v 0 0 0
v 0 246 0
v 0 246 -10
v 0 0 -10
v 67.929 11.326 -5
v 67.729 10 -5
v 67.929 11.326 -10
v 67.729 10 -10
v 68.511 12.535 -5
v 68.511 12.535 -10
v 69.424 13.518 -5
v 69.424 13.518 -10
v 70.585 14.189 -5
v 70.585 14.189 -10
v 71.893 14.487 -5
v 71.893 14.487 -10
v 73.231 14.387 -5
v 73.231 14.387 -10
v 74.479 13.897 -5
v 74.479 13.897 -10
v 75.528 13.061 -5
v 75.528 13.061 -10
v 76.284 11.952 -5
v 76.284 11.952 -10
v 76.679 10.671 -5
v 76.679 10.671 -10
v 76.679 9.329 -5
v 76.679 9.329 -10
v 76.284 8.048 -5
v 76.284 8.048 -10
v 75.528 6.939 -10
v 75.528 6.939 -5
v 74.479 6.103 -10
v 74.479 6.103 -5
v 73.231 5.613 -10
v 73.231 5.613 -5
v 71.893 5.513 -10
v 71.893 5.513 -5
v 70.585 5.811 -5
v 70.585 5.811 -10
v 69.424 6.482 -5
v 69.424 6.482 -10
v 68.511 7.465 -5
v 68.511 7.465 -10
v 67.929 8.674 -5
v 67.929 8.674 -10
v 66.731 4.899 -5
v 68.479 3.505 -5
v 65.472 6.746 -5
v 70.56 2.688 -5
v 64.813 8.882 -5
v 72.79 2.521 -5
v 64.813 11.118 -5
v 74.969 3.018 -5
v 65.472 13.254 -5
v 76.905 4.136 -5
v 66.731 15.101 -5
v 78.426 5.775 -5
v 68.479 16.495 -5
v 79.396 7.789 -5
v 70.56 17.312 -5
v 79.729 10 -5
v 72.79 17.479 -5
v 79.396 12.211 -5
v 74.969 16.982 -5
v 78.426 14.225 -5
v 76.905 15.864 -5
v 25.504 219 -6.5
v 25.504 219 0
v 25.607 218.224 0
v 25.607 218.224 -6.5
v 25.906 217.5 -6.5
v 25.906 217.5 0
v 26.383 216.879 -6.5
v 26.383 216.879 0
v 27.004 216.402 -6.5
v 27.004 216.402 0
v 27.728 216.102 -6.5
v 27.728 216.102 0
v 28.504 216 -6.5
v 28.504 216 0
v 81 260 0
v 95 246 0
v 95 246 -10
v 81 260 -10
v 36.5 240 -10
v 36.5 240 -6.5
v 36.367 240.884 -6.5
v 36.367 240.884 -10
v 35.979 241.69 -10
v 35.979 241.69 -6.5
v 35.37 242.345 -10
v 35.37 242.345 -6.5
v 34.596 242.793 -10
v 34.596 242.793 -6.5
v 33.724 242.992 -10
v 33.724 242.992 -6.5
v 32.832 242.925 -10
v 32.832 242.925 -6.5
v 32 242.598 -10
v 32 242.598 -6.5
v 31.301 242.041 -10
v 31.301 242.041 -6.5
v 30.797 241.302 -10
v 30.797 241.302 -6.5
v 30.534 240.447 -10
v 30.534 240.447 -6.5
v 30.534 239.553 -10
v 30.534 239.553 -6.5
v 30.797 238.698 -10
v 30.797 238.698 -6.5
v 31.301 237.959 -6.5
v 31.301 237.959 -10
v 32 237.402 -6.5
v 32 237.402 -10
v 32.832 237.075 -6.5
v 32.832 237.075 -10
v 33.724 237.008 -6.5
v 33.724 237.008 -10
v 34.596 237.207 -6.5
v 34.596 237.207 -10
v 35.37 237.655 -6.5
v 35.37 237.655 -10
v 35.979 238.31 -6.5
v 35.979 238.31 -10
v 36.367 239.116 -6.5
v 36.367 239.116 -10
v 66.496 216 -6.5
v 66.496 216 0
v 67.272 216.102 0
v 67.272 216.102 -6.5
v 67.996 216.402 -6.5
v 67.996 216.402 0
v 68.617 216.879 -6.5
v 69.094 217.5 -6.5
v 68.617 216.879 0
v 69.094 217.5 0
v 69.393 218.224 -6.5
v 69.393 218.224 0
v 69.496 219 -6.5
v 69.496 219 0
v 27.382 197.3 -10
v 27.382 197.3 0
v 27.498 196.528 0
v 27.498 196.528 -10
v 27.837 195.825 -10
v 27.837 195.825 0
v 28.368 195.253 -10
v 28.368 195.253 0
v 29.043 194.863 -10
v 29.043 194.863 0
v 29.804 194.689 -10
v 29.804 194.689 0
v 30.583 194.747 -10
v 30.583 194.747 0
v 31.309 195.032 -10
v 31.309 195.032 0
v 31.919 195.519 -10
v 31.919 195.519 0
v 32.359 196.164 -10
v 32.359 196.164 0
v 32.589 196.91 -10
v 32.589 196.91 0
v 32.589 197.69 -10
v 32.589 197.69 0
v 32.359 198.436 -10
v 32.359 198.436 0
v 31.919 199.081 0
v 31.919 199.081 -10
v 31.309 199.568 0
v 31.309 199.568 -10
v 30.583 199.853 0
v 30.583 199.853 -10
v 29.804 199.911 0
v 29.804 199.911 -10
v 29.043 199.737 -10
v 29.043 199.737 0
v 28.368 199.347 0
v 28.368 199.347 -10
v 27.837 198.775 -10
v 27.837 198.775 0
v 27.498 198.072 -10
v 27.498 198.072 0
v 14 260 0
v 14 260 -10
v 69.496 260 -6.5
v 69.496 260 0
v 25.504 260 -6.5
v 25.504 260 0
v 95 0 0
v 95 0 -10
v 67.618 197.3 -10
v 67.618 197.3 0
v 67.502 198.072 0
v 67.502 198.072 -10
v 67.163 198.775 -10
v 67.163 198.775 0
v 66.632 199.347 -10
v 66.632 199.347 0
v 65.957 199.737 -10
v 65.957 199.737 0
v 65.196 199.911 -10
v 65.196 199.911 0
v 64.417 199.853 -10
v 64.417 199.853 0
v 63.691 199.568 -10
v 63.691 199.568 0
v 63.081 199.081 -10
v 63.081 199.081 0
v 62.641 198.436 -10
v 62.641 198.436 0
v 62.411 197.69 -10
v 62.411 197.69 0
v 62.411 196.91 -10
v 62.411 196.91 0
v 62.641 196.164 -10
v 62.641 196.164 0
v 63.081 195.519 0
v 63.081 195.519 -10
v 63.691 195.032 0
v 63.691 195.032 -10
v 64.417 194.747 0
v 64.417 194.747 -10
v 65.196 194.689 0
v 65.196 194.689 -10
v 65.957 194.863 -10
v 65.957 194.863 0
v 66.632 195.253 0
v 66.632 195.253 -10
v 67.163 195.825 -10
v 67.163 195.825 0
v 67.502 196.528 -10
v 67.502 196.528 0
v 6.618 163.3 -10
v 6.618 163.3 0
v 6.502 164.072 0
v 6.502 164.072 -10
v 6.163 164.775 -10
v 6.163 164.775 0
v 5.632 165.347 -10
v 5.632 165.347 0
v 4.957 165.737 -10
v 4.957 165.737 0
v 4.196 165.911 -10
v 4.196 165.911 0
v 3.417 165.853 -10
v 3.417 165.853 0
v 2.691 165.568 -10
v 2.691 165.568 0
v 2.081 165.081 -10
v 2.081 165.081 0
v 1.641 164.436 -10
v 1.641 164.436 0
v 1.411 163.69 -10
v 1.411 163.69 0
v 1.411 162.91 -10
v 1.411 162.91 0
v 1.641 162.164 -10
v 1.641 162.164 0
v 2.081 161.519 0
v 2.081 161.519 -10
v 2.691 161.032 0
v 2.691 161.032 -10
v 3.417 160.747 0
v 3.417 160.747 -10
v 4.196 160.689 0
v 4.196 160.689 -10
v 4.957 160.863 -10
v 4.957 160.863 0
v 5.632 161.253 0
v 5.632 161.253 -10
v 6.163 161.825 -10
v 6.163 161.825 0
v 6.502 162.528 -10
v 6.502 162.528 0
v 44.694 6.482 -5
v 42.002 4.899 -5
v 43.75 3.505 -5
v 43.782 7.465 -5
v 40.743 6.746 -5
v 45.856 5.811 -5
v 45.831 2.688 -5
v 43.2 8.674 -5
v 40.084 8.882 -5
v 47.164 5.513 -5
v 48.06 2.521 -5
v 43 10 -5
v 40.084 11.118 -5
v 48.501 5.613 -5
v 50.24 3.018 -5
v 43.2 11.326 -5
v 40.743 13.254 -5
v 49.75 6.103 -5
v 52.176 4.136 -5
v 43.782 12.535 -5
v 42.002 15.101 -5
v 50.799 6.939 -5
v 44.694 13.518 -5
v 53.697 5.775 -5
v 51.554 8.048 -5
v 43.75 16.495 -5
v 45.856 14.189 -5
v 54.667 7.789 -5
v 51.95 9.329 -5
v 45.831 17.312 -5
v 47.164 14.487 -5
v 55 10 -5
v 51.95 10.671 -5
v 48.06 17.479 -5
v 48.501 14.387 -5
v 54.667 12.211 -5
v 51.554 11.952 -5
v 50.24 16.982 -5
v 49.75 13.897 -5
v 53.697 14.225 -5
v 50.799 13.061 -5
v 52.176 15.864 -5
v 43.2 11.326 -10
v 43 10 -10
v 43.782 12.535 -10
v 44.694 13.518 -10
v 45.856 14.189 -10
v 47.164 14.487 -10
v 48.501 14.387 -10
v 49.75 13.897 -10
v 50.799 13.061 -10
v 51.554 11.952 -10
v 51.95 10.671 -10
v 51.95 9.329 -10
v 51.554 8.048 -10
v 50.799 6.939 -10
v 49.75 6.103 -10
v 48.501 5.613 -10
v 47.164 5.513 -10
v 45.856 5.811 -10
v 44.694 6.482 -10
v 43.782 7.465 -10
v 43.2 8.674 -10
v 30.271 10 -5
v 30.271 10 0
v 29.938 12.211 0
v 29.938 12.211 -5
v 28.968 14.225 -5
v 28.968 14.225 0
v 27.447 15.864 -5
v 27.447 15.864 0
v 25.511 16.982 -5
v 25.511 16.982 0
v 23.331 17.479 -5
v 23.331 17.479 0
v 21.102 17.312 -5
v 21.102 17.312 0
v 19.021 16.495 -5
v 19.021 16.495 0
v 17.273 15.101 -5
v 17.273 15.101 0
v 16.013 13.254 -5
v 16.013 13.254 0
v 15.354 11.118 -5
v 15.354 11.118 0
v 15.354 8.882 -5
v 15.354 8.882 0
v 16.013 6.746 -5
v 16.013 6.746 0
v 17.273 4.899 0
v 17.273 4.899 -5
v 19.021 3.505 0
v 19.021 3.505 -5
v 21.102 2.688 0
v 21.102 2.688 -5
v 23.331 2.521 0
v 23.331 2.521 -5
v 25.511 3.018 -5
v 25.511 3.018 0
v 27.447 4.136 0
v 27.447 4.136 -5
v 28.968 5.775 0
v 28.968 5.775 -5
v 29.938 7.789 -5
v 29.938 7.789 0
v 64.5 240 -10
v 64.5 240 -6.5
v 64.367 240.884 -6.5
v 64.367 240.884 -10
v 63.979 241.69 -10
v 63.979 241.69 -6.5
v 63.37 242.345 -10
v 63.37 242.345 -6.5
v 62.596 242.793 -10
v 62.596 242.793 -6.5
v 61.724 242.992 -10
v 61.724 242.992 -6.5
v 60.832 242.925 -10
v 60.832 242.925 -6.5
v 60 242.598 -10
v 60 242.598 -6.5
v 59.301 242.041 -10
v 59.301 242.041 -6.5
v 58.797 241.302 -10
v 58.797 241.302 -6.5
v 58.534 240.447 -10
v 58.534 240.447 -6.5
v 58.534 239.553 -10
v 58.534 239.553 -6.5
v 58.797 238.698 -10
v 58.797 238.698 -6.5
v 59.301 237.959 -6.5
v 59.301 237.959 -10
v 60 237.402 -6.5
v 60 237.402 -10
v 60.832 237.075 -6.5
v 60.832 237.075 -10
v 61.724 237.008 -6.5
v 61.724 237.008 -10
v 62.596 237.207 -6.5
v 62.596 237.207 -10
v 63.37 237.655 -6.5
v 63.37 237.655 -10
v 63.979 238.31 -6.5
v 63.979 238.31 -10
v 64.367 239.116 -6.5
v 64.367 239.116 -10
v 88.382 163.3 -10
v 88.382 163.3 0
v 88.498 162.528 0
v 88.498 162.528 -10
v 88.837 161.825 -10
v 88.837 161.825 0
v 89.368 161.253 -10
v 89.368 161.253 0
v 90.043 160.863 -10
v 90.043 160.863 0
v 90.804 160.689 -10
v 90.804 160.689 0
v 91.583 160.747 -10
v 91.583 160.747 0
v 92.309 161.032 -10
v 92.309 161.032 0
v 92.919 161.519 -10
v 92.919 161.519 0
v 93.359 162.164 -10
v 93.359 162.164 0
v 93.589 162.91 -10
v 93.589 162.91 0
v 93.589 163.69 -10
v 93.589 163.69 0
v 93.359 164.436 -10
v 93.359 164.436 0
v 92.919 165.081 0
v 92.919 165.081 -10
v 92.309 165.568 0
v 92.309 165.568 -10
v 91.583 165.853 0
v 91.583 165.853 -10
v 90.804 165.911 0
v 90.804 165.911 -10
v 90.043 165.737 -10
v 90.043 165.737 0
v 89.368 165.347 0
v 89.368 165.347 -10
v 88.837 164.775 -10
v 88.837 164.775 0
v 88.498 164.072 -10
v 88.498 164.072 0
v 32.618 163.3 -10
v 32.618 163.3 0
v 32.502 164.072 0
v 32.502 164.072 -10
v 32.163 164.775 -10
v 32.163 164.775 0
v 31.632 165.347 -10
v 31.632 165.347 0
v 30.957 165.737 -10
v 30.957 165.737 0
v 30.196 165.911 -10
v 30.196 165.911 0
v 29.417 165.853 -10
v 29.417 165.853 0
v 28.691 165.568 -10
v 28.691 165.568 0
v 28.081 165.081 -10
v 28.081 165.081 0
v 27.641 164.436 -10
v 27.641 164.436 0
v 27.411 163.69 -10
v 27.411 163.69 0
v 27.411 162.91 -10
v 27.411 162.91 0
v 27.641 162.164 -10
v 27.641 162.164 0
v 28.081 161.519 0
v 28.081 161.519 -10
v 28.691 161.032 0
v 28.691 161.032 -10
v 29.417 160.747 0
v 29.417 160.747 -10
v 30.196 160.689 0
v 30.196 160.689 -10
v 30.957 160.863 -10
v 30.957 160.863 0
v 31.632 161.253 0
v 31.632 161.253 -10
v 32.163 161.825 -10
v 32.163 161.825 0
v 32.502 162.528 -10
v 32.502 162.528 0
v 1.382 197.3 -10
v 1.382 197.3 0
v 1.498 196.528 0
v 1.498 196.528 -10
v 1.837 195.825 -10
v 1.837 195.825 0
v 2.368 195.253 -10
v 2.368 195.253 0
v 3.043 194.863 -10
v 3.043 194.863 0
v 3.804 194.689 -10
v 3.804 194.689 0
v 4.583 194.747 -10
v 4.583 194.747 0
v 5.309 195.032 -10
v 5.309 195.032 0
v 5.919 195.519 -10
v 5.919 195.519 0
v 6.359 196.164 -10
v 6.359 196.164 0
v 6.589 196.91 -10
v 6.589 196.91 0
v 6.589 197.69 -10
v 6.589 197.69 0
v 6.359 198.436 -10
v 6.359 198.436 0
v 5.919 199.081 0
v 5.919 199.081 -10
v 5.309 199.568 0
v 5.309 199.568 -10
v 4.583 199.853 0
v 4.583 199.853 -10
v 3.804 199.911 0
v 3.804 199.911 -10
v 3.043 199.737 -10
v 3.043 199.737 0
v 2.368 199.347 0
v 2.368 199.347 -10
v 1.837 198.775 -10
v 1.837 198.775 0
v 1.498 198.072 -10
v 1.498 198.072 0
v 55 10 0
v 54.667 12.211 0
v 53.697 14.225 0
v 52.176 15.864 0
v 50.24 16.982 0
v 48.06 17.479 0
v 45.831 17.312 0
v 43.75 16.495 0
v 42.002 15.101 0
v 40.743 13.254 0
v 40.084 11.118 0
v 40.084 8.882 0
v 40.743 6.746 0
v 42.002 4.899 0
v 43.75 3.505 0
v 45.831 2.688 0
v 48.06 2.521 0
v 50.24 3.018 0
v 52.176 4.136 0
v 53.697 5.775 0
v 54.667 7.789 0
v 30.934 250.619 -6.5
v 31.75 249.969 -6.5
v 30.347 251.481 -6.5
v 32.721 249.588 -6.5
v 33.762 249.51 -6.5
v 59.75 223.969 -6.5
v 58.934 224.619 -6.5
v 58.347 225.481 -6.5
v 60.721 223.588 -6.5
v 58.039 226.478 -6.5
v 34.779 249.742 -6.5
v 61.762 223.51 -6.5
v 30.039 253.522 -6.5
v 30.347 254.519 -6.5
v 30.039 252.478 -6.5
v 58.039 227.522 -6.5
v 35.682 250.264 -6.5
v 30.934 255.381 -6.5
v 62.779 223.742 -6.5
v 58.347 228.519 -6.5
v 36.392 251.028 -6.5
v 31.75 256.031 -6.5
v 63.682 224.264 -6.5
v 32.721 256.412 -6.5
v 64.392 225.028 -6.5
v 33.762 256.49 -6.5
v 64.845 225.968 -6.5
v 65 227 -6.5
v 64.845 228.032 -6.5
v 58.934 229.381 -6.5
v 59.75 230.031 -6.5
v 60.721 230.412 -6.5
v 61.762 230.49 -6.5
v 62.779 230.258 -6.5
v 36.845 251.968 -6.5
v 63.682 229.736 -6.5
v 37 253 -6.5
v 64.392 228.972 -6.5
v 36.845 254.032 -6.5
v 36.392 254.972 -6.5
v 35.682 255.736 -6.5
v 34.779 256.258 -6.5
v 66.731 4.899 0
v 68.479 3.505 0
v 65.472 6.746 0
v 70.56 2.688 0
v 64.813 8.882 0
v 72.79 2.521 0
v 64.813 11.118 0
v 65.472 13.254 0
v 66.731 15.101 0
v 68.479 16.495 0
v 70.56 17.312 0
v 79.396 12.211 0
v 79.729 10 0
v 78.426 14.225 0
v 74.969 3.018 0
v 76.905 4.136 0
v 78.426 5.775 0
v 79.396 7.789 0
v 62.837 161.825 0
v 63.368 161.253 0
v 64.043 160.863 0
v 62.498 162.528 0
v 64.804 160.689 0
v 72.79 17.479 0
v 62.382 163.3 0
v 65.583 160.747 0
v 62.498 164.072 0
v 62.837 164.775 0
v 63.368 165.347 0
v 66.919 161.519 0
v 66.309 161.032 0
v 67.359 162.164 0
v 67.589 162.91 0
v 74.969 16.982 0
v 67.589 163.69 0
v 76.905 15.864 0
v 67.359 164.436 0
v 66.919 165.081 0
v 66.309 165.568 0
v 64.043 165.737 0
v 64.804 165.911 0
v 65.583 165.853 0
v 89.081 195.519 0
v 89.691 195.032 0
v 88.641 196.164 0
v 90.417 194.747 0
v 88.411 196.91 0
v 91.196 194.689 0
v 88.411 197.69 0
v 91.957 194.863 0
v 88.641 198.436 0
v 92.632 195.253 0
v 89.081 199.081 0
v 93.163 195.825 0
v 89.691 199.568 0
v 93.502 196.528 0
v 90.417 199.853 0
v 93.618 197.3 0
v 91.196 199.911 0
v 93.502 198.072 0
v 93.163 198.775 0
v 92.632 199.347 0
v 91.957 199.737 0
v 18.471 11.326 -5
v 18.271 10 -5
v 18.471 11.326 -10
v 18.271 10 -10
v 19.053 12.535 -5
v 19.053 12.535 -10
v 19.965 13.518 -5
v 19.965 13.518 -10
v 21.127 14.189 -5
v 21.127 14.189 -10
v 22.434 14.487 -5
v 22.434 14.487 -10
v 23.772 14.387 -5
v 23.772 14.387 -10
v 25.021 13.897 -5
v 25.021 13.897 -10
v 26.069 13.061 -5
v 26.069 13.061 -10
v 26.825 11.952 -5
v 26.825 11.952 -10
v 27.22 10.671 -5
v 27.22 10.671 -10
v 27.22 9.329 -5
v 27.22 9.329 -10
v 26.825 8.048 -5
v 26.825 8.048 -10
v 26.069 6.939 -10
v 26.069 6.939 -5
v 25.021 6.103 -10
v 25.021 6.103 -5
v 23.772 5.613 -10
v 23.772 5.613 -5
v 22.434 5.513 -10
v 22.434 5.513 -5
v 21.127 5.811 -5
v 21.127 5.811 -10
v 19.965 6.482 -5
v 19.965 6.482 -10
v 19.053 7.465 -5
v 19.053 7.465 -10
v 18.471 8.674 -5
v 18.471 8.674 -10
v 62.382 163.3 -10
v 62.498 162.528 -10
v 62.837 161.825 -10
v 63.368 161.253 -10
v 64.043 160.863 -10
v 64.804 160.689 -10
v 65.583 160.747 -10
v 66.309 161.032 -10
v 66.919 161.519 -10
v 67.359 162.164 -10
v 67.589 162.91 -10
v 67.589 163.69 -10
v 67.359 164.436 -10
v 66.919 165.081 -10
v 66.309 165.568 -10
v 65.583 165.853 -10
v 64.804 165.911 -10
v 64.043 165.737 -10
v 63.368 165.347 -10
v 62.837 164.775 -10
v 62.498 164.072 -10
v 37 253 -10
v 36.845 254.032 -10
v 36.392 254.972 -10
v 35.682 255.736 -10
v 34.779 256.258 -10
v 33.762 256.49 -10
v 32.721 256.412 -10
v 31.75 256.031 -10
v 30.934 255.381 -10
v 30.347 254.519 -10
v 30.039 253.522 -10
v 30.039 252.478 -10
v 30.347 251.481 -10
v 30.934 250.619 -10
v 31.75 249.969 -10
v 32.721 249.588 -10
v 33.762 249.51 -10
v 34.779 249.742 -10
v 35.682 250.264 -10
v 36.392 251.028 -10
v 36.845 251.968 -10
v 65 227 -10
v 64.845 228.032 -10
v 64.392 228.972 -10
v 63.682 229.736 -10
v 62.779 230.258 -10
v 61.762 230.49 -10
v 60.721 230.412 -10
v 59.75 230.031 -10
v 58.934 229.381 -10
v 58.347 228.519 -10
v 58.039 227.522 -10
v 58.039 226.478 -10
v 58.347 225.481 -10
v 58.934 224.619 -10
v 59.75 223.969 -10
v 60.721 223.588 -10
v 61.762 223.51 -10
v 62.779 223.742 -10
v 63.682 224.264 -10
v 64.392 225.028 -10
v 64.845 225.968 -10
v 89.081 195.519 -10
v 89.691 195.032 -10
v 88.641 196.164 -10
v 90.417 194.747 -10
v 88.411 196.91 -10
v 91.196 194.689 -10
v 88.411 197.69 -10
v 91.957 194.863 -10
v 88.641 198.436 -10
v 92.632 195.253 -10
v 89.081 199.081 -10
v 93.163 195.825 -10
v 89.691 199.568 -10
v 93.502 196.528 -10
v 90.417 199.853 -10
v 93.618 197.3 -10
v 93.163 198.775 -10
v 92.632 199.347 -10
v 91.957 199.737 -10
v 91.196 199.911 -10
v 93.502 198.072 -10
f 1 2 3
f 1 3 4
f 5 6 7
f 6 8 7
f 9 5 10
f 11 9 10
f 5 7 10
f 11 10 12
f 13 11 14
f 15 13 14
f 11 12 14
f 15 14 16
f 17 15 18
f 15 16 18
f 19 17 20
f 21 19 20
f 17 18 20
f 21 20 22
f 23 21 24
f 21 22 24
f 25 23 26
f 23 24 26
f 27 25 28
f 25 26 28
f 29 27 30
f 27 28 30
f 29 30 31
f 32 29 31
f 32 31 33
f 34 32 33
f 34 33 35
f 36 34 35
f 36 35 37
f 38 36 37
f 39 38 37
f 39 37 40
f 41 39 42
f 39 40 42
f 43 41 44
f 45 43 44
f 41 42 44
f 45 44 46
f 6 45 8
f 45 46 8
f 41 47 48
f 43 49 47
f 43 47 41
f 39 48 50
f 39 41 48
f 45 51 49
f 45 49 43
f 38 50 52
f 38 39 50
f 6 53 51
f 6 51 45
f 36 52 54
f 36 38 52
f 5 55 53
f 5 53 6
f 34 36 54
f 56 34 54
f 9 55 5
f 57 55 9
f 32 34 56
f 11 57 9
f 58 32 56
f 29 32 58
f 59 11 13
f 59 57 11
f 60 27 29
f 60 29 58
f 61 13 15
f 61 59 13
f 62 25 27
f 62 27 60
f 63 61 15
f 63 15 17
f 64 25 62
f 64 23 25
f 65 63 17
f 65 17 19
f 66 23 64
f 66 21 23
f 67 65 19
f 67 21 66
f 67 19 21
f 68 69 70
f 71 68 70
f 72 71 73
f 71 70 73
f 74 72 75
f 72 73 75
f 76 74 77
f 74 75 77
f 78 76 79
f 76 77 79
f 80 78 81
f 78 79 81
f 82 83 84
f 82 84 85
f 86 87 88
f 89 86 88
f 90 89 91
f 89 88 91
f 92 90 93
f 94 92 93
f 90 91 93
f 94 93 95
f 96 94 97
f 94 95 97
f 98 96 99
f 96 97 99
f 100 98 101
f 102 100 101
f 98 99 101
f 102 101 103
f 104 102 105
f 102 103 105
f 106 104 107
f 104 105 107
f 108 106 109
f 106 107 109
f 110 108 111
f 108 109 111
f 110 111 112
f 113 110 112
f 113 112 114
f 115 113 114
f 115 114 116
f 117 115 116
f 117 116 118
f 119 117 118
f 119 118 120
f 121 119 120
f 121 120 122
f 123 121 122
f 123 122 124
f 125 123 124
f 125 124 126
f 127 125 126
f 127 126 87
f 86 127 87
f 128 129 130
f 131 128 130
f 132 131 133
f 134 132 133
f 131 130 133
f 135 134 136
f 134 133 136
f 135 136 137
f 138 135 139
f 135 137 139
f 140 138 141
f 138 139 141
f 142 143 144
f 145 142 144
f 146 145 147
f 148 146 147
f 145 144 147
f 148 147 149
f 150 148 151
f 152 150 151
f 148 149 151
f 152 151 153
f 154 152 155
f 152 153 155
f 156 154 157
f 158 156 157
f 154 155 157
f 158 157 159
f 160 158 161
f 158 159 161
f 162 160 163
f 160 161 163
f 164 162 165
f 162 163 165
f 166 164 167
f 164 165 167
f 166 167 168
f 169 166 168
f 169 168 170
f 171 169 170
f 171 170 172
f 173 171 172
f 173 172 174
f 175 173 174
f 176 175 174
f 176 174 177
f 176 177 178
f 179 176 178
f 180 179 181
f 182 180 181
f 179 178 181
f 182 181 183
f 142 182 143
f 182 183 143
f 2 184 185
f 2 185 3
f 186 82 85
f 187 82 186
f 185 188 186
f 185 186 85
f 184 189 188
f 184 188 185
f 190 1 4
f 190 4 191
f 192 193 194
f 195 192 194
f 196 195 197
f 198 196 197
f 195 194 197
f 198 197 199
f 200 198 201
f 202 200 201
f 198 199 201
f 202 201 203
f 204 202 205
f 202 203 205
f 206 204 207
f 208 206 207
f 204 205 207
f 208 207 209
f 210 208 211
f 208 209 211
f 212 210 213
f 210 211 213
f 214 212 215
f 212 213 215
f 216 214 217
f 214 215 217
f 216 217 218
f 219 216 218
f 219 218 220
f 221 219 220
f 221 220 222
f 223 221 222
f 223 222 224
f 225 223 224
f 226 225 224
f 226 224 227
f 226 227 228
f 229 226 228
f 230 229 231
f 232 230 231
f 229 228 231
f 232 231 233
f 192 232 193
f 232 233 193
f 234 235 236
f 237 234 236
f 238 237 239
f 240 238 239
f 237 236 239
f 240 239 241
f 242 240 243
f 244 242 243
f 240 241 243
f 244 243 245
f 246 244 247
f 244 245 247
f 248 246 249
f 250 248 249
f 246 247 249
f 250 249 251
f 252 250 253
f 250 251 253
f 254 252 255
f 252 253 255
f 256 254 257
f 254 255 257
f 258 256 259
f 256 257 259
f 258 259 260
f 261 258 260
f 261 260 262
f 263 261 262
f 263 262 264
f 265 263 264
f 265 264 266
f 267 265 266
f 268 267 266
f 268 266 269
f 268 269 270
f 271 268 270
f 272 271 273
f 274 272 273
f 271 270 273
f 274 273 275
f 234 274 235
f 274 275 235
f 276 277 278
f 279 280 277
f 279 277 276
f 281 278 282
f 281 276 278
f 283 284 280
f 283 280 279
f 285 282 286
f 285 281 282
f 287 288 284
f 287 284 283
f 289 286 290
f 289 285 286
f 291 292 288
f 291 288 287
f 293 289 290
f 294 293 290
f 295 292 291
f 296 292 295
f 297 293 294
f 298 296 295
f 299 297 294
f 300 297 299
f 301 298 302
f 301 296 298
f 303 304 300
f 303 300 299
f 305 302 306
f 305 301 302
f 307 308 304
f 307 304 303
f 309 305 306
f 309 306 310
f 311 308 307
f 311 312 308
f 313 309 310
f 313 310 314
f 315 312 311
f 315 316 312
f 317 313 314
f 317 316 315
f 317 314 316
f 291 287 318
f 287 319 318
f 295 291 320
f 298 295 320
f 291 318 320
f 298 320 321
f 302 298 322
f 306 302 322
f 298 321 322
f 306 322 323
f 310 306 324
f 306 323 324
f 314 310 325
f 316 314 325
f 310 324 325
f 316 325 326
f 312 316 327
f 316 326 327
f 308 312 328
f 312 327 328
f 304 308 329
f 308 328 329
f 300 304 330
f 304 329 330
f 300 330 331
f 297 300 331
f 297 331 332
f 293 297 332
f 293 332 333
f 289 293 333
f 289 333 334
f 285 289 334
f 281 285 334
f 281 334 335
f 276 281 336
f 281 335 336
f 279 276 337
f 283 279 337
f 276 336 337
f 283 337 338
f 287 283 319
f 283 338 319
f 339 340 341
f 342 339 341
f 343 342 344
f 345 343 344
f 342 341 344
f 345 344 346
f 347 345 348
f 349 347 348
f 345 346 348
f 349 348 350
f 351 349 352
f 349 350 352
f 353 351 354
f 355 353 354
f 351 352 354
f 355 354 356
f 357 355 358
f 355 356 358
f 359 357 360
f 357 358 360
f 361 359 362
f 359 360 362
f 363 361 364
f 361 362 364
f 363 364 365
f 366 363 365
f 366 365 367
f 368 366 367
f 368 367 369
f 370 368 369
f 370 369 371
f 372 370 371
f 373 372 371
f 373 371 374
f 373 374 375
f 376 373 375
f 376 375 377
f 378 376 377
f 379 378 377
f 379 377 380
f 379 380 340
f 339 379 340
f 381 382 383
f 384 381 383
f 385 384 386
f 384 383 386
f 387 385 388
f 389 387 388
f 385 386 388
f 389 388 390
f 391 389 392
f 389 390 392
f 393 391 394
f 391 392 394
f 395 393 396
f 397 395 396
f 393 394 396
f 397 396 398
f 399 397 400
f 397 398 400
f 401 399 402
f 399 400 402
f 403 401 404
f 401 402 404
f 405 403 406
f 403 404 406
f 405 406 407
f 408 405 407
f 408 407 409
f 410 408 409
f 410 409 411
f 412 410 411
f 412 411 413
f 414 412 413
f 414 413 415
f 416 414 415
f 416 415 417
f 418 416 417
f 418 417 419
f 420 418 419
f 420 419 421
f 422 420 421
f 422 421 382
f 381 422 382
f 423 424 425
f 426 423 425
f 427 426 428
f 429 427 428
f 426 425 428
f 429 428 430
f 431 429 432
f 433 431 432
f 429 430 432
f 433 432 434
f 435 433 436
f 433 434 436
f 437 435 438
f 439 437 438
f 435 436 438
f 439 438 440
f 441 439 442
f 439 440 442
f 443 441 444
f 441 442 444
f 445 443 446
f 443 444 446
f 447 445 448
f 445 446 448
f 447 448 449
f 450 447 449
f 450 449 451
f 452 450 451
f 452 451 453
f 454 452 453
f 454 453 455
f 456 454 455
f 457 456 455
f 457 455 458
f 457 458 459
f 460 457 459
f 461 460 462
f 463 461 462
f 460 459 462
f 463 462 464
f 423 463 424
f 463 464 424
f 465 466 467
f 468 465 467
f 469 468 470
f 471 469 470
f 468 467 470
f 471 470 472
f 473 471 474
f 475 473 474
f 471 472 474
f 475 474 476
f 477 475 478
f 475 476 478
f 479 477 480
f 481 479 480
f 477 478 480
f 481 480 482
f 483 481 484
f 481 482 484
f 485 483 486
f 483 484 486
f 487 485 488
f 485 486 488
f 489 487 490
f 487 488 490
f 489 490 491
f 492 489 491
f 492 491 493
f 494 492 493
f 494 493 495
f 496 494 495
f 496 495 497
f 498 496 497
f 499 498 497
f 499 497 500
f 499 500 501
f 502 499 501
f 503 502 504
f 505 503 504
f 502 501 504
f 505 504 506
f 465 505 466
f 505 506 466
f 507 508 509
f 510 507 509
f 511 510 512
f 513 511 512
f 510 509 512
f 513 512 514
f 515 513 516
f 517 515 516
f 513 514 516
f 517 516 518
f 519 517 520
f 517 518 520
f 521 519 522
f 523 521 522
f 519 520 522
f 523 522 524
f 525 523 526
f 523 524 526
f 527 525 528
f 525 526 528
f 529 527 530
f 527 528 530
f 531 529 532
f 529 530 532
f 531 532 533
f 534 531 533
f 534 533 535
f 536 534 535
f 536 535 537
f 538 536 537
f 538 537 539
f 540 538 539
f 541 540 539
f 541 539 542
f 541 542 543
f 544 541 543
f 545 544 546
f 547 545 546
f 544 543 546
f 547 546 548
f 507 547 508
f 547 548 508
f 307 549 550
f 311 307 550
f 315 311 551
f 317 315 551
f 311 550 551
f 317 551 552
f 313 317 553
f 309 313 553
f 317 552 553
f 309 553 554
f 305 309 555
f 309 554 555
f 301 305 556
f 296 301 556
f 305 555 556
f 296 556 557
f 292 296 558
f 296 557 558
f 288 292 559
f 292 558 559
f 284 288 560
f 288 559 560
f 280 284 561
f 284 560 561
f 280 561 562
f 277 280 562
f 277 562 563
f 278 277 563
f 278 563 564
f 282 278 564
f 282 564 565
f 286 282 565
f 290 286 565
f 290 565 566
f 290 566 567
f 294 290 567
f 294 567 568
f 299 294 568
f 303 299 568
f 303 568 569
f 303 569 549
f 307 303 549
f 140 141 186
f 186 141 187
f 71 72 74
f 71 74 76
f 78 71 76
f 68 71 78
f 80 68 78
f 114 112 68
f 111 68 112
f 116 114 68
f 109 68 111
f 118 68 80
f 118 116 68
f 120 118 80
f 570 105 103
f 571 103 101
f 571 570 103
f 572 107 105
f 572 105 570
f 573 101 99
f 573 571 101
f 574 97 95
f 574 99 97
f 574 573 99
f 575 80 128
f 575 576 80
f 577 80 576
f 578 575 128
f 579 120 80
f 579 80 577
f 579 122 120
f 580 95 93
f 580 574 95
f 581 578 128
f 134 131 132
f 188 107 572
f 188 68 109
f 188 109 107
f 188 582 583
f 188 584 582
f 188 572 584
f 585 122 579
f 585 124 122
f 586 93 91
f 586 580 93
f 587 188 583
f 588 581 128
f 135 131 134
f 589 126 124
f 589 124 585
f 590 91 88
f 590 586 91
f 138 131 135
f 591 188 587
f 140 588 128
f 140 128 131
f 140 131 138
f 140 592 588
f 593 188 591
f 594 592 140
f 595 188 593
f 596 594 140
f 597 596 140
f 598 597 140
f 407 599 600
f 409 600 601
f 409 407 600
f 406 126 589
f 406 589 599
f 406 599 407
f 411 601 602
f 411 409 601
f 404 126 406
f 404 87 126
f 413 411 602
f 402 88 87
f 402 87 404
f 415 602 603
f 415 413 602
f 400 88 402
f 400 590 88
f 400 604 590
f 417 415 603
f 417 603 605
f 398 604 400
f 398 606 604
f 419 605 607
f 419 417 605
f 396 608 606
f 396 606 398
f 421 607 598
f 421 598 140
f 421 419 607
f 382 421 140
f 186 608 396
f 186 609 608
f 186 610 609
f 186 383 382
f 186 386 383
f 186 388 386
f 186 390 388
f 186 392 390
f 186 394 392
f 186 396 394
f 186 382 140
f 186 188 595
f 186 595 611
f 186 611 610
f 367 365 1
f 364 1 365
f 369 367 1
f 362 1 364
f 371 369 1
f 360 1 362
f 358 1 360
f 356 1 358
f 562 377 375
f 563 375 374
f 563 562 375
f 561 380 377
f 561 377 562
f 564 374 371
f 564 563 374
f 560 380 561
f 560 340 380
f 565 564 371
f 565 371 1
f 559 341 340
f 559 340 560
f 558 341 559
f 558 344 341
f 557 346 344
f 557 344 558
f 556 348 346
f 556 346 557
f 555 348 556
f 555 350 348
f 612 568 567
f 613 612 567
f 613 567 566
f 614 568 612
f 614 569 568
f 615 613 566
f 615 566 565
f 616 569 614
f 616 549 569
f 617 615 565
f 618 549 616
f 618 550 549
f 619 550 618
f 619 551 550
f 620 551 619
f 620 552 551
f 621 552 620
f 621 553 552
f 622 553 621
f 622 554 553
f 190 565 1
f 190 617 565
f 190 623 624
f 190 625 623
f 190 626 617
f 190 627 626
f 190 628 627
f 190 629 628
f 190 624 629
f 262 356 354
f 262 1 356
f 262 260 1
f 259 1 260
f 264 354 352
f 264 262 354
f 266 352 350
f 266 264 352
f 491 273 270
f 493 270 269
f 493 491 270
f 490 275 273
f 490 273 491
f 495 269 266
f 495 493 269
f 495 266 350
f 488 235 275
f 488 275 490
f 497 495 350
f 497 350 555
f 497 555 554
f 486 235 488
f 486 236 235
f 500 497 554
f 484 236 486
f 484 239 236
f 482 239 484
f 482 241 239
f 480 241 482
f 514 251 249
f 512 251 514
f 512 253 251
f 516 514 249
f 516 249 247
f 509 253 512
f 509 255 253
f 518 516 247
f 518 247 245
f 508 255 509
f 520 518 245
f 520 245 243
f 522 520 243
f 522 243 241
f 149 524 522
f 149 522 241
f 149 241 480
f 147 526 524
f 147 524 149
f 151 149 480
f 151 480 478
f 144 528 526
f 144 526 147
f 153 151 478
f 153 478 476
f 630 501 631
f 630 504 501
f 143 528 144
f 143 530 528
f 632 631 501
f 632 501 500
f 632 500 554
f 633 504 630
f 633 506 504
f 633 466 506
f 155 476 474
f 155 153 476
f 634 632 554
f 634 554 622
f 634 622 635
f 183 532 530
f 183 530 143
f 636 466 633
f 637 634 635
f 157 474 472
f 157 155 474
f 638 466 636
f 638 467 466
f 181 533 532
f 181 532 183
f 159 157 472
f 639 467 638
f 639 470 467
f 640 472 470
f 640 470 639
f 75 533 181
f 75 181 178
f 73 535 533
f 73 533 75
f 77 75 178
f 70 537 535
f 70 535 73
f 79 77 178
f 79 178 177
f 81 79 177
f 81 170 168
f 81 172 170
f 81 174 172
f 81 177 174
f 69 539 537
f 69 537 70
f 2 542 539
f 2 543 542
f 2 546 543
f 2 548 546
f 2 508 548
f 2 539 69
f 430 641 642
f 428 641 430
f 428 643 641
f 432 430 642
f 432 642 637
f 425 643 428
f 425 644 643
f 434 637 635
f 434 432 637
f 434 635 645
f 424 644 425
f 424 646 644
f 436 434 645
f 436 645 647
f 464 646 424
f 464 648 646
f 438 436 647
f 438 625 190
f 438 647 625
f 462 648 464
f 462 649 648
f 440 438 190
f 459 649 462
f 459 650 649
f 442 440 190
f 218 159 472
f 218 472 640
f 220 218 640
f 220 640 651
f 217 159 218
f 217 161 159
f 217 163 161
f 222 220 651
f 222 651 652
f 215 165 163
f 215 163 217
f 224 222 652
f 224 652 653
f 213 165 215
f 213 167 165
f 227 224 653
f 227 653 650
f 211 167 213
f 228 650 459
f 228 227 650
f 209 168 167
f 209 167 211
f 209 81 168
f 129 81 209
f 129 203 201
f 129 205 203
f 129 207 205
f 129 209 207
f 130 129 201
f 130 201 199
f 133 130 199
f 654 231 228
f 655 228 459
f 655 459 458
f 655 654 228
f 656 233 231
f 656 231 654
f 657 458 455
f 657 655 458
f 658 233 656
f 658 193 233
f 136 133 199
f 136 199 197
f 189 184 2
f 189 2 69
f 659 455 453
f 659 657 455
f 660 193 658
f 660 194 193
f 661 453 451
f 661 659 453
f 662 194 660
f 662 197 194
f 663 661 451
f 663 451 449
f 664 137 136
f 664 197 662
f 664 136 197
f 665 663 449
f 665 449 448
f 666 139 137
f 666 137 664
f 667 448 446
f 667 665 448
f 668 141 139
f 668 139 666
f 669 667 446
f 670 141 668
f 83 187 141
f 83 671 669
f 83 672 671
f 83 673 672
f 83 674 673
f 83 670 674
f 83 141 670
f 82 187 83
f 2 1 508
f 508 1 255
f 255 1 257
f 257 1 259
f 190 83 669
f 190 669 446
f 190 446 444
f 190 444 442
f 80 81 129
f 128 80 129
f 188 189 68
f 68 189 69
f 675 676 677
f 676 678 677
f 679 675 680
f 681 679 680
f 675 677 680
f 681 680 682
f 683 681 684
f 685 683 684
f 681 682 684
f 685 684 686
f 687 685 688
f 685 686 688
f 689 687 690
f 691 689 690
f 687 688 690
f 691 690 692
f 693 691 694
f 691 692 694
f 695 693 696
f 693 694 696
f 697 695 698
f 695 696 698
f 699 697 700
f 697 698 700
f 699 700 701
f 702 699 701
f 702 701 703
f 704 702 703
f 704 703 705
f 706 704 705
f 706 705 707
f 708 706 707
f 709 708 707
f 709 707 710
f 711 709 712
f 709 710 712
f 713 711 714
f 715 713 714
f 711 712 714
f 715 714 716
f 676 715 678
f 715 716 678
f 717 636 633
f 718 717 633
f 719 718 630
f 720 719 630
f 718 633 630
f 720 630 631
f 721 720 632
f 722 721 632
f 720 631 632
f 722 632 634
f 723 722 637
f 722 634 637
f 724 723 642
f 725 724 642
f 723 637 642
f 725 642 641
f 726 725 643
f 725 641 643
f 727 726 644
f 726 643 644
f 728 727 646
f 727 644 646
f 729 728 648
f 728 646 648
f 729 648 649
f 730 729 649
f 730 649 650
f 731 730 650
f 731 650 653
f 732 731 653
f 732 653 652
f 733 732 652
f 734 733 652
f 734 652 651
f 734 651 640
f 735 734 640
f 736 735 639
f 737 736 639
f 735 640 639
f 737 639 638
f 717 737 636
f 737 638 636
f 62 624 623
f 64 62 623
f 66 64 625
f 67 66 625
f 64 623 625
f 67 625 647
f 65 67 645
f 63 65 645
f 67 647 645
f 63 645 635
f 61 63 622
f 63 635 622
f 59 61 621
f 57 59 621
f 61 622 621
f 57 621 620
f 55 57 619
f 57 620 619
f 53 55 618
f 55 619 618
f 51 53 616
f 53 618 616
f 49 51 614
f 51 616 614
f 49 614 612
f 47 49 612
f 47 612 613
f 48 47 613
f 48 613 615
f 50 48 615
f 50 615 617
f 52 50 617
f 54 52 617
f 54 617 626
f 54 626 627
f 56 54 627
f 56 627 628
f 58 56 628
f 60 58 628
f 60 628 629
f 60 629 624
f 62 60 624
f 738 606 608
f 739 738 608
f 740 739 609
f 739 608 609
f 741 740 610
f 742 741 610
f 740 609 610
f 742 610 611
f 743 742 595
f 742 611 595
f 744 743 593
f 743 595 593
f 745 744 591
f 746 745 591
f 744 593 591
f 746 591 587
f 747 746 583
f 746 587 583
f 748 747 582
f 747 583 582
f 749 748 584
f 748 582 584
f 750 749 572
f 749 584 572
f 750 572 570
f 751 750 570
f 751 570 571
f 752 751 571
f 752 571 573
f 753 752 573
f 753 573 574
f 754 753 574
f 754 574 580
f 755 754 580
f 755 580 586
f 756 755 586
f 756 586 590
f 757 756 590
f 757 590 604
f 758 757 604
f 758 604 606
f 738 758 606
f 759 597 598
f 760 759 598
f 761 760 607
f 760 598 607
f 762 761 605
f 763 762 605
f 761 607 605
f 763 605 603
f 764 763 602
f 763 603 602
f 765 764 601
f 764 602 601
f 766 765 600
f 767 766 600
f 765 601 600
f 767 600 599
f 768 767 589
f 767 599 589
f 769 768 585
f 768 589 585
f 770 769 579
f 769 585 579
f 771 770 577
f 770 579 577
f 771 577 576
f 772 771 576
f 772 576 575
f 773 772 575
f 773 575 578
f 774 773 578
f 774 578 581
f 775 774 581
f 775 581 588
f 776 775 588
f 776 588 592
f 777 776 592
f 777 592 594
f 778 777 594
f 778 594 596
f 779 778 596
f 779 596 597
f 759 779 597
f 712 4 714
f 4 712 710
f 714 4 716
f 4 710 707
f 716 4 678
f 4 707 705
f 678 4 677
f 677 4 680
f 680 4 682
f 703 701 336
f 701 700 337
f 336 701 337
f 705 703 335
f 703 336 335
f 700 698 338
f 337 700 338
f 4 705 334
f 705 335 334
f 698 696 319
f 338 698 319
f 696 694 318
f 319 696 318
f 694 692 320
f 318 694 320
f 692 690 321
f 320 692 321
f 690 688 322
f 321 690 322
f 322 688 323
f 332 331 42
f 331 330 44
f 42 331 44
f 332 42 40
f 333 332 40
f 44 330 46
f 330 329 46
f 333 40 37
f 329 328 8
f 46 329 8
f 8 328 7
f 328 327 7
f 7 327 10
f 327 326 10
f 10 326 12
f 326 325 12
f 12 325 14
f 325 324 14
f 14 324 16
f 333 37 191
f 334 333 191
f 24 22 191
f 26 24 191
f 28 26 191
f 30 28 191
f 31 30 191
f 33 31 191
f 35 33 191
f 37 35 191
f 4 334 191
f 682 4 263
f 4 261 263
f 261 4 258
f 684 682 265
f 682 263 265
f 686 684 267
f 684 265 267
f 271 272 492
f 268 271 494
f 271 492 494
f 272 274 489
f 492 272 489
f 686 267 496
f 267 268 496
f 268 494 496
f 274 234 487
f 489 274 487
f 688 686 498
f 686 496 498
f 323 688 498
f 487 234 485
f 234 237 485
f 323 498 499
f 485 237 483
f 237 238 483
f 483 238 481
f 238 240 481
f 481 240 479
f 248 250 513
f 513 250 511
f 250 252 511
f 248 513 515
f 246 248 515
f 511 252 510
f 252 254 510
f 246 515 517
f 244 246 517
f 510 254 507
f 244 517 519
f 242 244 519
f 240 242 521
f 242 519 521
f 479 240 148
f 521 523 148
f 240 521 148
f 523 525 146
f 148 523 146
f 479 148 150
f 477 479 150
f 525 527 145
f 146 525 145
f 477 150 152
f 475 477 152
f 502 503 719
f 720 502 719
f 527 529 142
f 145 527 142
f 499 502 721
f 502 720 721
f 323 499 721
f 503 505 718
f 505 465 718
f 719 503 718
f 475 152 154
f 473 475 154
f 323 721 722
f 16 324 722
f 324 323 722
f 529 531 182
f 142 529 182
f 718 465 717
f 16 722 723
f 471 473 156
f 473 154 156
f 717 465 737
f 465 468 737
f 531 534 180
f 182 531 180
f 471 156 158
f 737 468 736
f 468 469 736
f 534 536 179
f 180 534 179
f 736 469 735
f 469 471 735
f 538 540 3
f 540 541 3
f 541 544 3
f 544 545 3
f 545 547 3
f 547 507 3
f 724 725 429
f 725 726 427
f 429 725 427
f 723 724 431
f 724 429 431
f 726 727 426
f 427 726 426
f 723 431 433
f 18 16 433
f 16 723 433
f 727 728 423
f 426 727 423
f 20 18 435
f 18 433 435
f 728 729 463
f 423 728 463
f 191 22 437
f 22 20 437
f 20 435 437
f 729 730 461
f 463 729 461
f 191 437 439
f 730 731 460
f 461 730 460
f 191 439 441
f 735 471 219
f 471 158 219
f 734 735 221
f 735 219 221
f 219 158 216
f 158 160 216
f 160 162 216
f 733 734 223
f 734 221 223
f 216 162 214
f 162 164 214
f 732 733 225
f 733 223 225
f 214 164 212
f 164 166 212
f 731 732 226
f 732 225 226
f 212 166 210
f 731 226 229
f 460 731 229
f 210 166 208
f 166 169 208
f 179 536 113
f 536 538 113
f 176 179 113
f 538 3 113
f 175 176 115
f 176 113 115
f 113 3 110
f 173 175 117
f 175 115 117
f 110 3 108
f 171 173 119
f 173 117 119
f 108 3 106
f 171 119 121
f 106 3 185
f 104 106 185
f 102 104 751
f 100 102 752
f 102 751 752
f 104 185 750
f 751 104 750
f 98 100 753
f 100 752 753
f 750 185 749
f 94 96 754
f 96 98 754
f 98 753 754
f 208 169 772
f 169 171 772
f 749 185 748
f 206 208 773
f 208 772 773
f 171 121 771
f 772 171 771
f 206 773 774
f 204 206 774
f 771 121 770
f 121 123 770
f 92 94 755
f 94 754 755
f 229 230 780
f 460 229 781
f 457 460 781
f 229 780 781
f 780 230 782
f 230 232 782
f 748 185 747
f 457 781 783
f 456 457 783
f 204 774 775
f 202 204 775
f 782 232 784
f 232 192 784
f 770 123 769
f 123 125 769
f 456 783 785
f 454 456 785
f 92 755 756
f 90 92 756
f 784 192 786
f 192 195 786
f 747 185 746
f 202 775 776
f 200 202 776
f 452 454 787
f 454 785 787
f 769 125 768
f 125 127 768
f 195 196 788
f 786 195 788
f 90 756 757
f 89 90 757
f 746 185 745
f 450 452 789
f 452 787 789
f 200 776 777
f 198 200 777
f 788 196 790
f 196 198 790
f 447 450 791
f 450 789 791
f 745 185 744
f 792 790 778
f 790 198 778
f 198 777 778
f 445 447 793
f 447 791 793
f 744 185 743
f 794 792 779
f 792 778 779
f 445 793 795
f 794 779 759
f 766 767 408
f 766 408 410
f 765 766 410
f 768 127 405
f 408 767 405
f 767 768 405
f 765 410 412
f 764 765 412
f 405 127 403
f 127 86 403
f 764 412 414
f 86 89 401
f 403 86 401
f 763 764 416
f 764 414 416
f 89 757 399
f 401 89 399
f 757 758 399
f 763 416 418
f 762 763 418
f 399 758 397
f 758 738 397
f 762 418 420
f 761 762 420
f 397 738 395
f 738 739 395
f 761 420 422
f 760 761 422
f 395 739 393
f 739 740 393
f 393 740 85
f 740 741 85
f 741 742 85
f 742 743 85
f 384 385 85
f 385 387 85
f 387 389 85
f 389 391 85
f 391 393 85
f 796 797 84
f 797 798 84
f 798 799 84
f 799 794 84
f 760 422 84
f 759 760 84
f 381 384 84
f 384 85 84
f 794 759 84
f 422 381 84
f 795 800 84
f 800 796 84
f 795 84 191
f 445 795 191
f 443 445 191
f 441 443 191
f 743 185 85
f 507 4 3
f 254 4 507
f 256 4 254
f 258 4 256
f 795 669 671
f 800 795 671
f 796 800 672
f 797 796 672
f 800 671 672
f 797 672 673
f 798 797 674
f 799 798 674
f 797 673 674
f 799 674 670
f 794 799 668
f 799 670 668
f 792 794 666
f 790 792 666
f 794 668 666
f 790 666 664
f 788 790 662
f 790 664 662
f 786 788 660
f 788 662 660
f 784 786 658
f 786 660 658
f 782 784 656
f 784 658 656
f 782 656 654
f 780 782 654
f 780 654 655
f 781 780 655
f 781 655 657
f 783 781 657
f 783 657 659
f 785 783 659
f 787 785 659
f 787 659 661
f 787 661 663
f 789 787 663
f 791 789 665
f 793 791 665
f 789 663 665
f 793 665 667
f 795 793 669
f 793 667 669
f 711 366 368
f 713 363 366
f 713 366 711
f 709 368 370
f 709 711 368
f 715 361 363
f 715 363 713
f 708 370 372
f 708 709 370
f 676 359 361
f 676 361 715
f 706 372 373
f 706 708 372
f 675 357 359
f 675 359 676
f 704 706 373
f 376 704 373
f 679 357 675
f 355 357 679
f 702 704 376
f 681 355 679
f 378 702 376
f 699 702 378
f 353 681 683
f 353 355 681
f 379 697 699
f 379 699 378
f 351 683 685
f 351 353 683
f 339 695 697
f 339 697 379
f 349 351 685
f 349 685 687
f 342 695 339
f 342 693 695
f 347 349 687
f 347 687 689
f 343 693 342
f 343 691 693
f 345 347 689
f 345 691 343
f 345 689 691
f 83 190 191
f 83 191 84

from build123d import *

# Parameters (mm, degrees)
SCHIZZO1_R                                           = 4.2
SCHIZZO1_R_2                                         = 2.61831532
ESTRUSIONE_ESTRUSIONE1_DEPTH                         = 10
TAGLIO_ESTRUSIONE1_DEPTH                             = 6.5
SCHIZZO3_R                                           = 3.5
SCHIZZO3_R_2                                         = 3
TAGLIO_ESTRUSIONE2_DEPTH                             = 6.5
FORO_LAMATO_PER_VITE_M8_A_TESTA_CILINDRI_D           = 9
FORO_LAMATO_PER_VITE_M8_A_TESTA_CILINDRI_CBORE_D     = 15
FORO_LAMATO_PER_VITE_M8_A_TESTA_CILINDRI_CBORE_DEPTH = 5


with BuildPart() as part:
    # Schizzo1 → Estrusione-Estrusione1 (new body)
    with BuildSketch(Plane.XY):
        Polygon((0, 0), (95, 0), (95, 246), (81, 260), (14, 260), (0, 246), align=None)
        with Locations((22.770722004, 10)):
            Circle(SCHIZZO1_R, mode=Mode.SUBTRACT)
        with Locations((47.5, 10)):
            Circle(SCHIZZO1_R, mode=Mode.SUBTRACT)
        with Locations(Location((72.229277996, 10, 0), (0, 0, 180))):
            Circle(SCHIZZO1_R, mode=Mode.SUBTRACT)
        with Locations((4, 163.3)):
            Circle(SCHIZZO1_R_2, mode=Mode.SUBTRACT)
        with Locations((30, 163.3)):
            Circle(SCHIZZO1_R_2, mode=Mode.SUBTRACT)
        with Locations(Location((65, 163.3, 0), (0, 0, 180))):
            Circle(SCHIZZO1_R_2, mode=Mode.SUBTRACT)
        with Locations(Location((91, 163.3, 0), (0, 0, 180))):
            Circle(SCHIZZO1_R_2, mode=Mode.SUBTRACT)
        with Locations((91, 197.3)):
            Circle(SCHIZZO1_R_2, mode=Mode.SUBTRACT)
        with Locations((65, 197.3)):
            Circle(SCHIZZO1_R_2, mode=Mode.SUBTRACT)
        with Locations(Location((30, 197.3, 0), (0, 0, 180))):
            Circle(SCHIZZO1_R_2, mode=Mode.SUBTRACT)
        with Locations(Location((4, 197.3, 0), (0, 0, 180))):
            Circle(SCHIZZO1_R_2, mode=Mode.SUBTRACT)
    extrude(amount=-ESTRUSIONE_ESTRUSIONE1_DEPTH)

    # Schizzo2 → Taglio-Estrusione1 (cut)
    with BuildSketch(Plane.XY):
        with BuildLine():
            Line((25.504353305, 260), (25.504353305, 219))
            ThreePointArc((25.504353305, 219), (26.383032962, 216.878679656), (28.504353305, 216))
            Line((28.504353305, 216), (66.495646695, 216))
            ThreePointArc((66.495646695, 216), (68.616967038, 216.878679656), (69.495646695, 219))
            Line((69.495646695, 219), (69.495646695, 260))
            Line((69.495646695, 260), (25.504353305, 260))
        make_face()
    extrude(amount=-TAGLIO_ESTRUSIONE1_DEPTH, mode=Mode.SUBTRACT)

    # Schizzo3 → Taglio-Estrusione2 (cut)
    with BuildSketch(Plane.XY.offset(-6.5)):
        with Locations((33.5, 253)):
            Circle(SCHIZZO3_R)
        with Locations((33.5, 240)):
            Circle(SCHIZZO3_R_2)
        with Locations((61.5, 240)):
            Circle(SCHIZZO3_R_2)
        with Locations((61.5, 227)):
            Circle(SCHIZZO3_R)
    extrude(amount=-TAGLIO_ESTRUSIONE2_DEPTH, mode=Mode.SUBTRACT)

    # Foro lamato per Vite M8 a testa cilindrica piana-1 (through all)
    with Locations(Plane(origin=(47.5, 10, 0), x_dir=(1, 0, 0), z_dir=(0, 0, 1))):
        with Locations((0, 0), (-24.729277996, 0), (24.729277996, 0)):
            CounterBoreHole(FORO_LAMATO_PER_VITE_M8_A_TESTA_CILINDRI_D / 2, FORO_LAMATO_PER_VITE_M8_A_TESTA_CILINDRI_CBORE_D / 2, FORO_LAMATO_PER_VITE_M8_A_TESTA_CILINDRI_CBORE_DEPTH)


solid = part.part
